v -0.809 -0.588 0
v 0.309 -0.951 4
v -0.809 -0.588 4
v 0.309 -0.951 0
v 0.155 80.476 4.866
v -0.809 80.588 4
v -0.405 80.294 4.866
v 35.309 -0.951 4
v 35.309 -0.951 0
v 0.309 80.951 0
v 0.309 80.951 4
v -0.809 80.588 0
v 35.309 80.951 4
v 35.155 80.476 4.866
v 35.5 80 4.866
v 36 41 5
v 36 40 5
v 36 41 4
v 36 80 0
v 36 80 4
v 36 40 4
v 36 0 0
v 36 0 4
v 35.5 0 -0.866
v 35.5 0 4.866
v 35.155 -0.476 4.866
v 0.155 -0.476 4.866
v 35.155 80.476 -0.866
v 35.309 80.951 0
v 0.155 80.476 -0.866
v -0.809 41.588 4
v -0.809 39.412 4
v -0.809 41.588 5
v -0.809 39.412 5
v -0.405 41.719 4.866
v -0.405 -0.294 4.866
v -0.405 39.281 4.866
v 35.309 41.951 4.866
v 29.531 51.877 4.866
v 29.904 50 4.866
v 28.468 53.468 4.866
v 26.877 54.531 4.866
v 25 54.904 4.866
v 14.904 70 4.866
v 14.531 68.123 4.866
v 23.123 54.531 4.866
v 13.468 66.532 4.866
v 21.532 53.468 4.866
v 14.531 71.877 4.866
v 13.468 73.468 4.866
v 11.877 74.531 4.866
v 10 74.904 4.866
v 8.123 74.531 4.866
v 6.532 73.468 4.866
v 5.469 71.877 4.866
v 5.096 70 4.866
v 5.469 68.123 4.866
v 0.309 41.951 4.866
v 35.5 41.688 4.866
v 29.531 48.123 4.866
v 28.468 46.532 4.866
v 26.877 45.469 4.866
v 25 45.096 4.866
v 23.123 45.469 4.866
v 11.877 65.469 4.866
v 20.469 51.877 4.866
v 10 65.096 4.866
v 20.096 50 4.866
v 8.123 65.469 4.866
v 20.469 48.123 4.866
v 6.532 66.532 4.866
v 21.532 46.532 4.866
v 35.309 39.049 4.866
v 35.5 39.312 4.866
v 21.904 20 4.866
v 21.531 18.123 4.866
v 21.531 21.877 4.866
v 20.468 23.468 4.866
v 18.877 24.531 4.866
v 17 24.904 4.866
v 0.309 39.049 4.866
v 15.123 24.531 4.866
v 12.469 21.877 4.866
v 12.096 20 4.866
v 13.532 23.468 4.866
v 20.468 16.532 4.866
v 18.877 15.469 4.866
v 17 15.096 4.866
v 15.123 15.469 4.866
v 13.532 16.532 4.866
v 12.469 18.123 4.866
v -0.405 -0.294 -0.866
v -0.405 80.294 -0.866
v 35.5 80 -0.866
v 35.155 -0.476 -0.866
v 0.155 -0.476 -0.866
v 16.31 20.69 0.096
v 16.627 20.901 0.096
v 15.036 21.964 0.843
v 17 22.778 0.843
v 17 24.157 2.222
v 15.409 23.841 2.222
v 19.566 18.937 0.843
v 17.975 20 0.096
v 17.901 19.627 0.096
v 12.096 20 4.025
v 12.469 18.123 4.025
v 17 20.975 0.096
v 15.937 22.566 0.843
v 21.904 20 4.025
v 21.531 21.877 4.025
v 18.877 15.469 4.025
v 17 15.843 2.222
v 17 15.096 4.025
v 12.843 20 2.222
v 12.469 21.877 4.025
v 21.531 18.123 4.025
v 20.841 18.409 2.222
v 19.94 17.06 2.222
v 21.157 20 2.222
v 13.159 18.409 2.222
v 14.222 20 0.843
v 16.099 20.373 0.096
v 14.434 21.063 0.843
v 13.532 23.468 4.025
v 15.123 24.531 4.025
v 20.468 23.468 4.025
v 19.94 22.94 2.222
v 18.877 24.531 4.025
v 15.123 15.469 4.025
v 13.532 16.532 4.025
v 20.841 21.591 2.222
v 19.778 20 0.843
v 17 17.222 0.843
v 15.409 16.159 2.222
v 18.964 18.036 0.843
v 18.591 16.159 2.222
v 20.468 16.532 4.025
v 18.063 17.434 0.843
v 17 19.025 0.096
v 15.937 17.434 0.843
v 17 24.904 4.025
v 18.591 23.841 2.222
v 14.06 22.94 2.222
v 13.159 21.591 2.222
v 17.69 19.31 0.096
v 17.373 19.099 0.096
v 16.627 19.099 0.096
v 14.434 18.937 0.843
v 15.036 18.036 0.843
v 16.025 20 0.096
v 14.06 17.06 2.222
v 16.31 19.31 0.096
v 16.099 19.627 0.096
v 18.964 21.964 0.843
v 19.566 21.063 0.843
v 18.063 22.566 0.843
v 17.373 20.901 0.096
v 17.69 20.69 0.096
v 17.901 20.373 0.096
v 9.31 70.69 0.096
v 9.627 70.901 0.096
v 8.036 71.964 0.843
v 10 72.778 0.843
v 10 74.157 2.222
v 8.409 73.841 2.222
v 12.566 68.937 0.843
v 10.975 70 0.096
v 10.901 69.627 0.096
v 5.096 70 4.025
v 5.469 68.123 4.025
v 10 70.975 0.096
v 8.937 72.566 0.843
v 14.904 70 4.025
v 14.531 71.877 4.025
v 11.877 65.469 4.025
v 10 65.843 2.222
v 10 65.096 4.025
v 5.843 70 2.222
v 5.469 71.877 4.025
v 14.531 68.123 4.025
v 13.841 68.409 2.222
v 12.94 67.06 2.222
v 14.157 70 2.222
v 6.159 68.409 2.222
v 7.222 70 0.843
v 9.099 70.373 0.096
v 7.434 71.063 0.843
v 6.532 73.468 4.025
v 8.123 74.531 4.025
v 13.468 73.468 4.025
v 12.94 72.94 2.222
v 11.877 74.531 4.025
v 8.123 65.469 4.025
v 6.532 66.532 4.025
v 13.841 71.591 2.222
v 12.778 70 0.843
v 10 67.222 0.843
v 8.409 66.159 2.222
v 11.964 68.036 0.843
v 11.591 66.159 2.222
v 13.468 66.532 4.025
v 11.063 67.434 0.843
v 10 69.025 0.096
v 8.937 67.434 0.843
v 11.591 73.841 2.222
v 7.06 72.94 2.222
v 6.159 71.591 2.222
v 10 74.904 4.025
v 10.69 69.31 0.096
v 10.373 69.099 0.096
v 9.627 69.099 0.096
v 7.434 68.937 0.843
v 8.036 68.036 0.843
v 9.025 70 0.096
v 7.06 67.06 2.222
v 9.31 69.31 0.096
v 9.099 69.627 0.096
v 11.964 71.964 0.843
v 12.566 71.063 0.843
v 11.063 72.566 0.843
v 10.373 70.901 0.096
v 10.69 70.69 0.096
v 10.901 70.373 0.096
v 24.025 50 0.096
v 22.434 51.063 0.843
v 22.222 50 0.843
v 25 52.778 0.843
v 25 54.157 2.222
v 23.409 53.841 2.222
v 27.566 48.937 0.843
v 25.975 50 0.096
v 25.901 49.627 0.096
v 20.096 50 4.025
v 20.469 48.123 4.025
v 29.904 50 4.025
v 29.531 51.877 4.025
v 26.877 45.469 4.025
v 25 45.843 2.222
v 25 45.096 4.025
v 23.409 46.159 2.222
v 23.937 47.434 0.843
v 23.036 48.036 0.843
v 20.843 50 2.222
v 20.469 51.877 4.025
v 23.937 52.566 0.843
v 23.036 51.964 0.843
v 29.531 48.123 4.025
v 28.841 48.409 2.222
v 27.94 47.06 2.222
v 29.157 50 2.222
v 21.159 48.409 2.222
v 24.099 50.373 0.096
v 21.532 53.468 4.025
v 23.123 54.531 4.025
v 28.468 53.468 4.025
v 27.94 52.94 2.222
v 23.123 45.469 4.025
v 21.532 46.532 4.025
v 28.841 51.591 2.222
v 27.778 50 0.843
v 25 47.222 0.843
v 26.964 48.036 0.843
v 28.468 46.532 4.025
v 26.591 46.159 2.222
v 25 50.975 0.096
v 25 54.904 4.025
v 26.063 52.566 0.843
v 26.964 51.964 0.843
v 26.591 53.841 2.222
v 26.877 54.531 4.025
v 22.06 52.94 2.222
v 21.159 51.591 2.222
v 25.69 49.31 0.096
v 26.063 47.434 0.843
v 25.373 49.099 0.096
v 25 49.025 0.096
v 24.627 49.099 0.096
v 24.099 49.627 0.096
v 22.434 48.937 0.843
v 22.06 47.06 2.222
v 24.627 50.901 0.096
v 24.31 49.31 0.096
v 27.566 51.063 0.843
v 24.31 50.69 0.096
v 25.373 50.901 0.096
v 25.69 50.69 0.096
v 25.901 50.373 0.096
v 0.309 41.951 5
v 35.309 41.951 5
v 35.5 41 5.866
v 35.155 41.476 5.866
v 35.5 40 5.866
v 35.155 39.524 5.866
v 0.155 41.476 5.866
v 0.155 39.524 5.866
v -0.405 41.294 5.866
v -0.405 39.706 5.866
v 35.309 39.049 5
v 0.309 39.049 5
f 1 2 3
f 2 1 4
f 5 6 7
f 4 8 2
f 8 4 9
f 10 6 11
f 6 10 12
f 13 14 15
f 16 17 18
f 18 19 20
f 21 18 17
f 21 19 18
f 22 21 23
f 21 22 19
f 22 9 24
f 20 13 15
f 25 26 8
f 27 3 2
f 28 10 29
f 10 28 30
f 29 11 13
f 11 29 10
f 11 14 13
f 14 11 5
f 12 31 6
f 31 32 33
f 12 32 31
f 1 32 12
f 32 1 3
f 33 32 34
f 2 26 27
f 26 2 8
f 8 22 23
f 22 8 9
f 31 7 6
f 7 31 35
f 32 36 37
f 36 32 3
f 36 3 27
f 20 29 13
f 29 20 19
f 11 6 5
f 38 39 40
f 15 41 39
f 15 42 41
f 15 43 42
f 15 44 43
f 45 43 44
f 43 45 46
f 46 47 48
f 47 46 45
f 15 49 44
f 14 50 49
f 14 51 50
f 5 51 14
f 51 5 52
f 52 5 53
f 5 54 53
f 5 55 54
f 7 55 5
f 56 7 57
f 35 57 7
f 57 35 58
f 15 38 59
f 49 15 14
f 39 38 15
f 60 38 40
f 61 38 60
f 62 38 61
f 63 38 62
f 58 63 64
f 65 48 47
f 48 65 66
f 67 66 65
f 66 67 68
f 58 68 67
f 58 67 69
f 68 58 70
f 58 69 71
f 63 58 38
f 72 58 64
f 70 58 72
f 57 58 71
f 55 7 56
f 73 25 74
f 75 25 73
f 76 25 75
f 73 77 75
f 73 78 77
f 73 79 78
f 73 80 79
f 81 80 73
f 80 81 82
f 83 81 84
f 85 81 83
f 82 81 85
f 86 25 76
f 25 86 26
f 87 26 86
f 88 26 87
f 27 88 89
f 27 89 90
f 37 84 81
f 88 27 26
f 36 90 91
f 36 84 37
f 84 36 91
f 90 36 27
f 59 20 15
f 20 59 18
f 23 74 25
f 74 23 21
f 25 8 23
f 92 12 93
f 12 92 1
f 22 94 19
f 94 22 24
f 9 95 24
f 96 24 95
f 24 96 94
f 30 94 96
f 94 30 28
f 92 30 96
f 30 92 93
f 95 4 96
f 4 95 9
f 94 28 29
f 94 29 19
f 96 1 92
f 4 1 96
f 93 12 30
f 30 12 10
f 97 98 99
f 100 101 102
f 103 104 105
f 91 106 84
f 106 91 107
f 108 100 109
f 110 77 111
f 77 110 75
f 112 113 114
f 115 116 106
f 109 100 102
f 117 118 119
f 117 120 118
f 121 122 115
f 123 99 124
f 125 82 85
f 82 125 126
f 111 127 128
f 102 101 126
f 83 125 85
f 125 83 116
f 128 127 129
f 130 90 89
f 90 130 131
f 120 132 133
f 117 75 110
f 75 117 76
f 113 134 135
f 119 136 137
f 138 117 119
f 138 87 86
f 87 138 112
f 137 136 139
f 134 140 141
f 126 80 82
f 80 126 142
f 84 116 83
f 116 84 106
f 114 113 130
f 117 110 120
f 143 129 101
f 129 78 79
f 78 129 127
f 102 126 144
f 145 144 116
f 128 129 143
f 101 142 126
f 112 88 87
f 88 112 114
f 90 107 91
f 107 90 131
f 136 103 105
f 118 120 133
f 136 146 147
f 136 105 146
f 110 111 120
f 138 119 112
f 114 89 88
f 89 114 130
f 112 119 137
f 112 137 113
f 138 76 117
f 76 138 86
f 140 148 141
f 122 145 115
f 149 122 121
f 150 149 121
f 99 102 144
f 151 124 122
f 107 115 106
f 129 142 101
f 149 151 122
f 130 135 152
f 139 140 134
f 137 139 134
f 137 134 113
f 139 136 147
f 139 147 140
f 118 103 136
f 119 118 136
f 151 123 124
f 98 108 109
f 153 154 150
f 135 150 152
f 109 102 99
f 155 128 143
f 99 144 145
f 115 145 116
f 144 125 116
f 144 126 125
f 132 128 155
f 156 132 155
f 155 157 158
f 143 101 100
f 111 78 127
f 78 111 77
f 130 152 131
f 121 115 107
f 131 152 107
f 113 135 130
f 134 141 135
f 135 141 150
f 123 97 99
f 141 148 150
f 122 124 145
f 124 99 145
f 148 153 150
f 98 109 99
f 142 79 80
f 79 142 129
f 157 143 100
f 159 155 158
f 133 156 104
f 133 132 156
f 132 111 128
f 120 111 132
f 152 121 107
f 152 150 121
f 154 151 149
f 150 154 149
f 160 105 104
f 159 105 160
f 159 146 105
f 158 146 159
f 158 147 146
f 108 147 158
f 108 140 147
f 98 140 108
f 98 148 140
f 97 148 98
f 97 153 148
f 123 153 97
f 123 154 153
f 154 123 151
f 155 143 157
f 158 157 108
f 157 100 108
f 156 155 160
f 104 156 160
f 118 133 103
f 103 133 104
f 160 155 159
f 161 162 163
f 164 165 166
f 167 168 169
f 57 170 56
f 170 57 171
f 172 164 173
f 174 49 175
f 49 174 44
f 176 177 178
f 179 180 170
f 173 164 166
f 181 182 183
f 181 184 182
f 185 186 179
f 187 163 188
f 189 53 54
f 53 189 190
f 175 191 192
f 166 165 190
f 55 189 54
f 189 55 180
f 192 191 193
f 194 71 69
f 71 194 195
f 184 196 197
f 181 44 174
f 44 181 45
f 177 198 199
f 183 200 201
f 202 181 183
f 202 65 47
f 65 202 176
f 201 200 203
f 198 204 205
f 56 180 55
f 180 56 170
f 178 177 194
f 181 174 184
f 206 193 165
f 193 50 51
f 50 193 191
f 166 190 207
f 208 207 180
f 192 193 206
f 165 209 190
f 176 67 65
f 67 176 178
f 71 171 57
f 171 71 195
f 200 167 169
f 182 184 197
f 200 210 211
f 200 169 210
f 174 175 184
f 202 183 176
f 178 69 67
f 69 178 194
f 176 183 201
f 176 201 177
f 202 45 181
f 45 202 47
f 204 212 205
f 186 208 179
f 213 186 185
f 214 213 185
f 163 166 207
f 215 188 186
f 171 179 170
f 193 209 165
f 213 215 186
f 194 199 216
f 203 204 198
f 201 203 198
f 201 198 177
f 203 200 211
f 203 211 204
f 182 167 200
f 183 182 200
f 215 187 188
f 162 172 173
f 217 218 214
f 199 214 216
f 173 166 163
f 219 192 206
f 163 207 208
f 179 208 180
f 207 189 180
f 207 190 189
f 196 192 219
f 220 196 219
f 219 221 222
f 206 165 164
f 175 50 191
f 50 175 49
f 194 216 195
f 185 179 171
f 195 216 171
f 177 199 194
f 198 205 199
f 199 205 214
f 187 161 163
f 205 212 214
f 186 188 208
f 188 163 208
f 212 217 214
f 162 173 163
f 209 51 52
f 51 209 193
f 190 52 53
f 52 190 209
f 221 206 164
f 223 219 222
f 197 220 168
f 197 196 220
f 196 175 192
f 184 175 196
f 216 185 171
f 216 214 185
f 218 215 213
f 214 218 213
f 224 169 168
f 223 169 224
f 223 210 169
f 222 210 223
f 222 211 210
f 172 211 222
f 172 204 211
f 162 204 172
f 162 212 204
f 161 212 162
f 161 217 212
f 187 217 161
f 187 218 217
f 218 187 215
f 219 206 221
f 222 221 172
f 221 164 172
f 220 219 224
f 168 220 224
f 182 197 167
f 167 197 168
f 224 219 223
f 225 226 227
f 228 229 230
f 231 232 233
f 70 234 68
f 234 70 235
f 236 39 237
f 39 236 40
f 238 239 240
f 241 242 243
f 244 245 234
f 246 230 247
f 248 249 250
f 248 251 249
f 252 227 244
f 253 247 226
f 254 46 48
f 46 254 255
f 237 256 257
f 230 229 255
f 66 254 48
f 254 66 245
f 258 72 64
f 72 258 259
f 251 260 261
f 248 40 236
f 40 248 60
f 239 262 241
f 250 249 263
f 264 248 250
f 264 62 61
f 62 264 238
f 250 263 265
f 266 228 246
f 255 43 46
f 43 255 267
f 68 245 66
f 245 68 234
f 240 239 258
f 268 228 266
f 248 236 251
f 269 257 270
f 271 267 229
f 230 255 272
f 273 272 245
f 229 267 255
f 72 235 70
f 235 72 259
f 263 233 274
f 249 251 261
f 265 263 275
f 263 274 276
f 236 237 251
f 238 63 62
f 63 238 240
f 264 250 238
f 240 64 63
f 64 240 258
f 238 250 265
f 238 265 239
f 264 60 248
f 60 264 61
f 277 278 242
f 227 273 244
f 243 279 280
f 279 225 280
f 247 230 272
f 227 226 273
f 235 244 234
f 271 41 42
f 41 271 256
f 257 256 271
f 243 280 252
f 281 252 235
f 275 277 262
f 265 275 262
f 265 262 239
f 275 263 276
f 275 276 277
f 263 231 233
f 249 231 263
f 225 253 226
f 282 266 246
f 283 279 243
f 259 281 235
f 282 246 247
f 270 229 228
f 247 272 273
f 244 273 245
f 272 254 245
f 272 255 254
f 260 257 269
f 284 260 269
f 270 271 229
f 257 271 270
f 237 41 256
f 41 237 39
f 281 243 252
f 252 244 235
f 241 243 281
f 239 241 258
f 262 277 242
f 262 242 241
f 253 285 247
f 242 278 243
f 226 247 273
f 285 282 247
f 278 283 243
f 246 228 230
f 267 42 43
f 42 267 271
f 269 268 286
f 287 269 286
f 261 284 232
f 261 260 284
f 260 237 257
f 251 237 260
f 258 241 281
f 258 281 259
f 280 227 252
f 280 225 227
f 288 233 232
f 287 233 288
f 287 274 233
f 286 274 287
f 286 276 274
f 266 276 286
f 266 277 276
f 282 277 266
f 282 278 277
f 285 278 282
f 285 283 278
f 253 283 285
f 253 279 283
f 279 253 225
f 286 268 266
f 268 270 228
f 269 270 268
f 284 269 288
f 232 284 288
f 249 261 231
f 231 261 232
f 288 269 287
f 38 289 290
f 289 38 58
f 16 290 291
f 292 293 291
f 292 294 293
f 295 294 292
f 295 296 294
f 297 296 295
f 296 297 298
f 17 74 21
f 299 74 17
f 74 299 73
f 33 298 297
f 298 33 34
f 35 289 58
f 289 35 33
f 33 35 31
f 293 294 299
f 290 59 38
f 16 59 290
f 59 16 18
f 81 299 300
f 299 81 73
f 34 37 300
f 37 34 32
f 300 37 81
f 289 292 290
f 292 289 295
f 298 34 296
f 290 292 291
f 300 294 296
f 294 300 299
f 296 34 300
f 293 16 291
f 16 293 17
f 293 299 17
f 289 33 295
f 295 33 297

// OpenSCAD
// Loguncov Maxim 13.12.13


//$fn=128;


translate([0,40,0])
minkowski()
{cube([35,1,5]);
sphere(1);
}

difference() {

//основа
minkowski()
{cube([35,80,4]);
sphere(1);
}

//отверстия
translate([17,20,5])sphere(5);

translate([10,70,5])sphere(5);
translate([25,50,5])sphere(5);




}
